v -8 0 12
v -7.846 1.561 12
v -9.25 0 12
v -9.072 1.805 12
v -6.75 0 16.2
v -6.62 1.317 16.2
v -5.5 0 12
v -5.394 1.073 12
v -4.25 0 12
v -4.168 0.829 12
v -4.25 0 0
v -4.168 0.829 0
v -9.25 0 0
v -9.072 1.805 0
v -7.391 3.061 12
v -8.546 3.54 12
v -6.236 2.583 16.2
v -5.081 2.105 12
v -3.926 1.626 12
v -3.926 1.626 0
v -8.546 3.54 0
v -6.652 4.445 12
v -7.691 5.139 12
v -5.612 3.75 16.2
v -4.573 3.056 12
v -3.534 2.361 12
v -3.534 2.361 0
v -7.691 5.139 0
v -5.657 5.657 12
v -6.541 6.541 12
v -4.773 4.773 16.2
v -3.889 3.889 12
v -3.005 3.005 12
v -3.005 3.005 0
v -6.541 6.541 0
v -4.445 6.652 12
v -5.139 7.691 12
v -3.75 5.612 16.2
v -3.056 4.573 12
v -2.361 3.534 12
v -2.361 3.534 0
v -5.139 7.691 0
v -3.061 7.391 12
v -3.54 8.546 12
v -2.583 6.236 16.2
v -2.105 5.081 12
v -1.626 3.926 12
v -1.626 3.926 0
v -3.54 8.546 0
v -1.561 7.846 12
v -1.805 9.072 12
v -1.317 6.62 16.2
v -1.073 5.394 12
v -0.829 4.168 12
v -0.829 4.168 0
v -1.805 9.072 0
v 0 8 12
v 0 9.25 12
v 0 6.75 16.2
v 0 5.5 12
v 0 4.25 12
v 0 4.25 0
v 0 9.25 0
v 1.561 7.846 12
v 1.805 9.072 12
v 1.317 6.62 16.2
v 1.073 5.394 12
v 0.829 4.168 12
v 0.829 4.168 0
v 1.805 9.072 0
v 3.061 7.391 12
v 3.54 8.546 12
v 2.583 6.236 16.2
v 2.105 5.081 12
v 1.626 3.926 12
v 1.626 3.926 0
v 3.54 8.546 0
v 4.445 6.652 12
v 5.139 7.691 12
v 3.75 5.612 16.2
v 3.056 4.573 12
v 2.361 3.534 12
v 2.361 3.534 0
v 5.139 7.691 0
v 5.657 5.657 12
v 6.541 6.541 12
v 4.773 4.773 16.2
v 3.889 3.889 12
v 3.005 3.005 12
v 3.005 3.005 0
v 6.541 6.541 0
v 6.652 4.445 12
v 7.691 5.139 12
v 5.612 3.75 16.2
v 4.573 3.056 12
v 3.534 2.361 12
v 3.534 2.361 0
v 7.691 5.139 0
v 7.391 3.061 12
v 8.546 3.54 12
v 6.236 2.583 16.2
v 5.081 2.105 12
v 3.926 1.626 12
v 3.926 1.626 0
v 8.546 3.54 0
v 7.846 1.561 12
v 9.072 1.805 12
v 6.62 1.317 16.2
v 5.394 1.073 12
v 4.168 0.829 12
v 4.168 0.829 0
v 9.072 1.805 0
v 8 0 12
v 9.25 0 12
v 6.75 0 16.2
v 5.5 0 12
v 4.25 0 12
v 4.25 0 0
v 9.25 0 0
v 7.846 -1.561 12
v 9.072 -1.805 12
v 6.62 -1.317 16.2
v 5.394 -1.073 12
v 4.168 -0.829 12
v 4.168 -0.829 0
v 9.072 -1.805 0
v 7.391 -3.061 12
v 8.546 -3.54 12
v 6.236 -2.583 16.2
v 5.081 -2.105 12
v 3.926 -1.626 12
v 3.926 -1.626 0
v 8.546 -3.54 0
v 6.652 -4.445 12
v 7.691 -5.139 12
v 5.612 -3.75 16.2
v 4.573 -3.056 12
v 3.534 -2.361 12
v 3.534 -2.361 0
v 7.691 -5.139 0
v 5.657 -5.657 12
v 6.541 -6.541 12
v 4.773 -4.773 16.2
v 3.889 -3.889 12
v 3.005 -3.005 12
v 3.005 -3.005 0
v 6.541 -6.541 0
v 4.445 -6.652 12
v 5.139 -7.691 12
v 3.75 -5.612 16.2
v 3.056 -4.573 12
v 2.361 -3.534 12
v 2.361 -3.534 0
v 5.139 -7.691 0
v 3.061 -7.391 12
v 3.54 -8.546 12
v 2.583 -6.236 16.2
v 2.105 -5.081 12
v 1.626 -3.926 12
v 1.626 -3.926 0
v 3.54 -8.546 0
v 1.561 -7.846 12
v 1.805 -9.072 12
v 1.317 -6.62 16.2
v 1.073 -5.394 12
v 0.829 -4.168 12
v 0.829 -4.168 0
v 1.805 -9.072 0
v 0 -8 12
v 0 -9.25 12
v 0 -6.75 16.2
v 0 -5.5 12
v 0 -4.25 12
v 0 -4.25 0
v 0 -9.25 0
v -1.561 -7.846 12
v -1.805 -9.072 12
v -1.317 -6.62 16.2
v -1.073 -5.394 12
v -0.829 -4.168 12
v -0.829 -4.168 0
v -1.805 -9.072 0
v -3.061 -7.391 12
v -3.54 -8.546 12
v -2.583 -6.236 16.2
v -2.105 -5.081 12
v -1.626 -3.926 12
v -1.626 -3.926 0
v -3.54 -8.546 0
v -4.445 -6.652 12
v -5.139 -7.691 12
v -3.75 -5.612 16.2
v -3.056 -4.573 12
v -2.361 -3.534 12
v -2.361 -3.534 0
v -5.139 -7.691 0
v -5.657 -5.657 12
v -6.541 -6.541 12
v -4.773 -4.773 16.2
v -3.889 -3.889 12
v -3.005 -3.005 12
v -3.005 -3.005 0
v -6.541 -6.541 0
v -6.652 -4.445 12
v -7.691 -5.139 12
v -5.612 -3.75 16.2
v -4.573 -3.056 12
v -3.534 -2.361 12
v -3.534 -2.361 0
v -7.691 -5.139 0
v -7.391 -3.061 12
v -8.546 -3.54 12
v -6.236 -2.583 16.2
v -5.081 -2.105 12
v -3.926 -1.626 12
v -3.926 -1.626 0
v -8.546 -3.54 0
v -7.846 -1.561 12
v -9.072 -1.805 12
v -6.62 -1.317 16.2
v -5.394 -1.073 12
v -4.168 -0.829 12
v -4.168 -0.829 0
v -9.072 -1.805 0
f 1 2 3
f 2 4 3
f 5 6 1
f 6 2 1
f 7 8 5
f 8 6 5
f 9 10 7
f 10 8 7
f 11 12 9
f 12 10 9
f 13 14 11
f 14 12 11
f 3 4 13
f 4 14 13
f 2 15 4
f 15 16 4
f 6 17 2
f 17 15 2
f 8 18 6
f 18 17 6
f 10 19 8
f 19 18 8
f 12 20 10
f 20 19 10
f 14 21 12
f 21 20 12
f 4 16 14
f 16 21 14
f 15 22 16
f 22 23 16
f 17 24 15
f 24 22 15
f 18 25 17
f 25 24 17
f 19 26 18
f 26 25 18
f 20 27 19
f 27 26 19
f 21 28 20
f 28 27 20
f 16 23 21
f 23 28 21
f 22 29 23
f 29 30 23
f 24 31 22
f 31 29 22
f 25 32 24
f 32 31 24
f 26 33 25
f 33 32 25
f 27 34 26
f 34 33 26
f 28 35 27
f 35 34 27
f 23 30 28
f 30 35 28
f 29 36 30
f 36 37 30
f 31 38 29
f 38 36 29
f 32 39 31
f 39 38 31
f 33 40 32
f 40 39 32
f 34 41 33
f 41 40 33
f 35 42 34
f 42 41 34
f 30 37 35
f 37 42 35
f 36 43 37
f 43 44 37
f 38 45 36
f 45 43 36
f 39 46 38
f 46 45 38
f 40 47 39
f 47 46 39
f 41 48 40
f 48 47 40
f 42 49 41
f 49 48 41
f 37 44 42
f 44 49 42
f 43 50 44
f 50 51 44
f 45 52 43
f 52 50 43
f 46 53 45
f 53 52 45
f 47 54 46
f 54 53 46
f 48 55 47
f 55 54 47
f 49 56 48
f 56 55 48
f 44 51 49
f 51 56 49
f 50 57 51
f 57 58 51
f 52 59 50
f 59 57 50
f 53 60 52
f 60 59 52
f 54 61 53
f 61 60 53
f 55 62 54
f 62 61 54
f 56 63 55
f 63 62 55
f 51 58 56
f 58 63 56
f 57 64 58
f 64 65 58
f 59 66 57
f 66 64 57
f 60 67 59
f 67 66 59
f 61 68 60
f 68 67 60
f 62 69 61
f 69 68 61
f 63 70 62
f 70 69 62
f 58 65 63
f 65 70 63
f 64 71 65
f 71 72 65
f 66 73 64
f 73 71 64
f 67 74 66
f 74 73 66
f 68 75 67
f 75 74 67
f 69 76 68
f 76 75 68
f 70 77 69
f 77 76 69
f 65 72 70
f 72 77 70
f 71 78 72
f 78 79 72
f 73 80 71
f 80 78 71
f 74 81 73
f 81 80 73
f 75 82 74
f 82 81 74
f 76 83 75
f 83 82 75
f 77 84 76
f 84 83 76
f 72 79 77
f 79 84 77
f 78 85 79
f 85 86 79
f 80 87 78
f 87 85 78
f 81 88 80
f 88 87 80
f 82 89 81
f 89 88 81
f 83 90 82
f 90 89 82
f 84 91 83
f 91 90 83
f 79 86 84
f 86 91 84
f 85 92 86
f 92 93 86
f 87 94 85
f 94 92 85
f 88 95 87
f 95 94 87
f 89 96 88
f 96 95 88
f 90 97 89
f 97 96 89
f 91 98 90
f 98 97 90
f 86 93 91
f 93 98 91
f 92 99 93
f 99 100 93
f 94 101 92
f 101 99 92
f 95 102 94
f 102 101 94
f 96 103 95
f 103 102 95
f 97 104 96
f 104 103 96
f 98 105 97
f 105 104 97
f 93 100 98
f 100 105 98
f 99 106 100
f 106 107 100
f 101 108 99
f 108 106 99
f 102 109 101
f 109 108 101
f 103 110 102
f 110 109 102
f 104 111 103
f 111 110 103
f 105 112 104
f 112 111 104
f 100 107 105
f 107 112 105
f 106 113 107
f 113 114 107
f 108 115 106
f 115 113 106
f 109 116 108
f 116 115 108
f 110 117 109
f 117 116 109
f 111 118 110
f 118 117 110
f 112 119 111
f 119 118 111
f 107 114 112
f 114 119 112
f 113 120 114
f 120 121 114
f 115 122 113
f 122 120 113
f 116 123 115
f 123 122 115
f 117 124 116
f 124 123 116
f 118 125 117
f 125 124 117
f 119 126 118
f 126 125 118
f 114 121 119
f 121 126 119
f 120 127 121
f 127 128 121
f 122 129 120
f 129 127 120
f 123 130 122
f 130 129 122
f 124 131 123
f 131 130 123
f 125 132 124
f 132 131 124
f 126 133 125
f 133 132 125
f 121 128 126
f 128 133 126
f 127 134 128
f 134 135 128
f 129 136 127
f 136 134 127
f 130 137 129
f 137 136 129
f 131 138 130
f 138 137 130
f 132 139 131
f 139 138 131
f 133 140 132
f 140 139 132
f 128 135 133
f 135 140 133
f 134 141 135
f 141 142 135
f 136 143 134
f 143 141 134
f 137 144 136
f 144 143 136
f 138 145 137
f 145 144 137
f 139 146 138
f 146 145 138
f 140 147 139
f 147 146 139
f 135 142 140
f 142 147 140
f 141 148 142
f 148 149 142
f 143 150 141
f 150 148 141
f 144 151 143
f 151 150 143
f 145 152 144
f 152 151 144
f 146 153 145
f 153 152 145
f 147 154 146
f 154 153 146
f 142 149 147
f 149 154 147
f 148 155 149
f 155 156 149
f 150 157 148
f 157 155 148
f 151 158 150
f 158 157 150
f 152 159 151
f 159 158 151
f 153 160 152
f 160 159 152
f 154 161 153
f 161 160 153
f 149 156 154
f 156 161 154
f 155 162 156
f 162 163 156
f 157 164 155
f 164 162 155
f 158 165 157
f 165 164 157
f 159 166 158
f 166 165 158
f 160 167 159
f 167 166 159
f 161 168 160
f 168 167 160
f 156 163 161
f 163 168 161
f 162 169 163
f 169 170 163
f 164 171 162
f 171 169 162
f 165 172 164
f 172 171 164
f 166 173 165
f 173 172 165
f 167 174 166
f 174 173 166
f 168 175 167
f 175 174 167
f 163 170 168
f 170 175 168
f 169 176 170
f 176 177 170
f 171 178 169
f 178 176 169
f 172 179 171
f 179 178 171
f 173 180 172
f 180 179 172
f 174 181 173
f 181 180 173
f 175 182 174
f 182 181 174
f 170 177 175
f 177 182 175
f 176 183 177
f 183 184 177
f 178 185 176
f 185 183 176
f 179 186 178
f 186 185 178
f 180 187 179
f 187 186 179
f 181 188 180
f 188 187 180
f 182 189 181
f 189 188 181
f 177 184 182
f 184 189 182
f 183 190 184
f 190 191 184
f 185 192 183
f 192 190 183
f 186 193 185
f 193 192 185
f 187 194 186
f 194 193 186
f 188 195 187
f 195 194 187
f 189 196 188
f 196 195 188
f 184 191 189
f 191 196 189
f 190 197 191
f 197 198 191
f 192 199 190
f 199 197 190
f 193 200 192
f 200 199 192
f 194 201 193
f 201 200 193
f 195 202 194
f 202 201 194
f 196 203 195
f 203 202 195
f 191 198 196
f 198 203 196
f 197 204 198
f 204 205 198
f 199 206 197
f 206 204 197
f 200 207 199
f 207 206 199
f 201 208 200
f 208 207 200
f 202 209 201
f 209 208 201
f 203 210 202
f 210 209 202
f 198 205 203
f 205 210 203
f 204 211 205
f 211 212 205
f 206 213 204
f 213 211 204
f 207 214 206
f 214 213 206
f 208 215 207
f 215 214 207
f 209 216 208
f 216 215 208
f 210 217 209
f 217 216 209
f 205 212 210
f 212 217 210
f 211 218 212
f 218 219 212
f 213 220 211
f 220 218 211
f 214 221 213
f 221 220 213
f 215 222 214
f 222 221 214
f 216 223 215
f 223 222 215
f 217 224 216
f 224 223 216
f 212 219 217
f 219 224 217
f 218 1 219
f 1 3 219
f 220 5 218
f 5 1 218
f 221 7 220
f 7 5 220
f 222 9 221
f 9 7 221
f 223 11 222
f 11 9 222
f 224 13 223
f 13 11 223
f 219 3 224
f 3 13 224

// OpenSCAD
$fn = 32;

// ----------------------------------------------------------------------
// Form washer: domed washer, 18.5 mm outside, 8.5 mm bore
// ----------------------------------------------------------------------

// --- parameters (mm) ---
revolve_angle = 360;      // full turn around the Z axis
profile_points = 7;       // points of the closed outline

profile = [[4.25, 0], [9.25, 0], [9.25, 12], [8, 12], [6.75, 16.2], [5.5, 12], [4.25, 12]];  // single closed polygon, 7 points, counter clockwise

// --- the one profile operation ---
rotate_extrude(angle = revolve_angle) polygon(points = profile);
